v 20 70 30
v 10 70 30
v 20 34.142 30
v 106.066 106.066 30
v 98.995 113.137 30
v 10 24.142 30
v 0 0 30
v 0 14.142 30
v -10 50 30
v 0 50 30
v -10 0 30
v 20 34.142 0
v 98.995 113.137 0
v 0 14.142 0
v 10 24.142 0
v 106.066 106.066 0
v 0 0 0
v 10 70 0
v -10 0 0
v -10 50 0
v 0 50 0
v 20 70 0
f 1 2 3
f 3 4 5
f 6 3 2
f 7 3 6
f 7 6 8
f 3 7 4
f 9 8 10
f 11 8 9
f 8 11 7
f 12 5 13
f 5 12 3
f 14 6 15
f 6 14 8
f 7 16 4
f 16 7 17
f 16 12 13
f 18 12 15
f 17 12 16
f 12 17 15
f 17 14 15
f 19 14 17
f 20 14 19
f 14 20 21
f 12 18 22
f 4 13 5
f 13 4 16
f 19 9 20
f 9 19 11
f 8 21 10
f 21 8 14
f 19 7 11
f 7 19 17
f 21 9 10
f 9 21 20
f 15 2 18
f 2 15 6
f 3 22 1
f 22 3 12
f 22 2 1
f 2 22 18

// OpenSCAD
// file: constants.scad
$fn = 20;

width = 30;
base_length = 150;
finger_length = 50;
thickness_part = 10;
gap_part = 1;
// zenbook
thickness_pc = 10;
finger_angle = 45;
// macbook pro
//thickness_pc = 15;
//finger_angle = 45;
// let's note
// thickness_pc = 10;
// finger_angle = 65;

gap_y = (thickness_pc+thickness_part)/sin(finger_angle);
foot_inclination = 15
// main file
include <constants.scad>;

rotate([0, -90, -45]) {
     stand();
}

module stand() {
     cube([width, base_length, thickness_part]);
     finger();
     translate([0, gap_y, 0]) finger();
}

module finger() {
     rotate([finger_angle, 0, 0]) cube([width, finger_length, thickness_part]);
}
